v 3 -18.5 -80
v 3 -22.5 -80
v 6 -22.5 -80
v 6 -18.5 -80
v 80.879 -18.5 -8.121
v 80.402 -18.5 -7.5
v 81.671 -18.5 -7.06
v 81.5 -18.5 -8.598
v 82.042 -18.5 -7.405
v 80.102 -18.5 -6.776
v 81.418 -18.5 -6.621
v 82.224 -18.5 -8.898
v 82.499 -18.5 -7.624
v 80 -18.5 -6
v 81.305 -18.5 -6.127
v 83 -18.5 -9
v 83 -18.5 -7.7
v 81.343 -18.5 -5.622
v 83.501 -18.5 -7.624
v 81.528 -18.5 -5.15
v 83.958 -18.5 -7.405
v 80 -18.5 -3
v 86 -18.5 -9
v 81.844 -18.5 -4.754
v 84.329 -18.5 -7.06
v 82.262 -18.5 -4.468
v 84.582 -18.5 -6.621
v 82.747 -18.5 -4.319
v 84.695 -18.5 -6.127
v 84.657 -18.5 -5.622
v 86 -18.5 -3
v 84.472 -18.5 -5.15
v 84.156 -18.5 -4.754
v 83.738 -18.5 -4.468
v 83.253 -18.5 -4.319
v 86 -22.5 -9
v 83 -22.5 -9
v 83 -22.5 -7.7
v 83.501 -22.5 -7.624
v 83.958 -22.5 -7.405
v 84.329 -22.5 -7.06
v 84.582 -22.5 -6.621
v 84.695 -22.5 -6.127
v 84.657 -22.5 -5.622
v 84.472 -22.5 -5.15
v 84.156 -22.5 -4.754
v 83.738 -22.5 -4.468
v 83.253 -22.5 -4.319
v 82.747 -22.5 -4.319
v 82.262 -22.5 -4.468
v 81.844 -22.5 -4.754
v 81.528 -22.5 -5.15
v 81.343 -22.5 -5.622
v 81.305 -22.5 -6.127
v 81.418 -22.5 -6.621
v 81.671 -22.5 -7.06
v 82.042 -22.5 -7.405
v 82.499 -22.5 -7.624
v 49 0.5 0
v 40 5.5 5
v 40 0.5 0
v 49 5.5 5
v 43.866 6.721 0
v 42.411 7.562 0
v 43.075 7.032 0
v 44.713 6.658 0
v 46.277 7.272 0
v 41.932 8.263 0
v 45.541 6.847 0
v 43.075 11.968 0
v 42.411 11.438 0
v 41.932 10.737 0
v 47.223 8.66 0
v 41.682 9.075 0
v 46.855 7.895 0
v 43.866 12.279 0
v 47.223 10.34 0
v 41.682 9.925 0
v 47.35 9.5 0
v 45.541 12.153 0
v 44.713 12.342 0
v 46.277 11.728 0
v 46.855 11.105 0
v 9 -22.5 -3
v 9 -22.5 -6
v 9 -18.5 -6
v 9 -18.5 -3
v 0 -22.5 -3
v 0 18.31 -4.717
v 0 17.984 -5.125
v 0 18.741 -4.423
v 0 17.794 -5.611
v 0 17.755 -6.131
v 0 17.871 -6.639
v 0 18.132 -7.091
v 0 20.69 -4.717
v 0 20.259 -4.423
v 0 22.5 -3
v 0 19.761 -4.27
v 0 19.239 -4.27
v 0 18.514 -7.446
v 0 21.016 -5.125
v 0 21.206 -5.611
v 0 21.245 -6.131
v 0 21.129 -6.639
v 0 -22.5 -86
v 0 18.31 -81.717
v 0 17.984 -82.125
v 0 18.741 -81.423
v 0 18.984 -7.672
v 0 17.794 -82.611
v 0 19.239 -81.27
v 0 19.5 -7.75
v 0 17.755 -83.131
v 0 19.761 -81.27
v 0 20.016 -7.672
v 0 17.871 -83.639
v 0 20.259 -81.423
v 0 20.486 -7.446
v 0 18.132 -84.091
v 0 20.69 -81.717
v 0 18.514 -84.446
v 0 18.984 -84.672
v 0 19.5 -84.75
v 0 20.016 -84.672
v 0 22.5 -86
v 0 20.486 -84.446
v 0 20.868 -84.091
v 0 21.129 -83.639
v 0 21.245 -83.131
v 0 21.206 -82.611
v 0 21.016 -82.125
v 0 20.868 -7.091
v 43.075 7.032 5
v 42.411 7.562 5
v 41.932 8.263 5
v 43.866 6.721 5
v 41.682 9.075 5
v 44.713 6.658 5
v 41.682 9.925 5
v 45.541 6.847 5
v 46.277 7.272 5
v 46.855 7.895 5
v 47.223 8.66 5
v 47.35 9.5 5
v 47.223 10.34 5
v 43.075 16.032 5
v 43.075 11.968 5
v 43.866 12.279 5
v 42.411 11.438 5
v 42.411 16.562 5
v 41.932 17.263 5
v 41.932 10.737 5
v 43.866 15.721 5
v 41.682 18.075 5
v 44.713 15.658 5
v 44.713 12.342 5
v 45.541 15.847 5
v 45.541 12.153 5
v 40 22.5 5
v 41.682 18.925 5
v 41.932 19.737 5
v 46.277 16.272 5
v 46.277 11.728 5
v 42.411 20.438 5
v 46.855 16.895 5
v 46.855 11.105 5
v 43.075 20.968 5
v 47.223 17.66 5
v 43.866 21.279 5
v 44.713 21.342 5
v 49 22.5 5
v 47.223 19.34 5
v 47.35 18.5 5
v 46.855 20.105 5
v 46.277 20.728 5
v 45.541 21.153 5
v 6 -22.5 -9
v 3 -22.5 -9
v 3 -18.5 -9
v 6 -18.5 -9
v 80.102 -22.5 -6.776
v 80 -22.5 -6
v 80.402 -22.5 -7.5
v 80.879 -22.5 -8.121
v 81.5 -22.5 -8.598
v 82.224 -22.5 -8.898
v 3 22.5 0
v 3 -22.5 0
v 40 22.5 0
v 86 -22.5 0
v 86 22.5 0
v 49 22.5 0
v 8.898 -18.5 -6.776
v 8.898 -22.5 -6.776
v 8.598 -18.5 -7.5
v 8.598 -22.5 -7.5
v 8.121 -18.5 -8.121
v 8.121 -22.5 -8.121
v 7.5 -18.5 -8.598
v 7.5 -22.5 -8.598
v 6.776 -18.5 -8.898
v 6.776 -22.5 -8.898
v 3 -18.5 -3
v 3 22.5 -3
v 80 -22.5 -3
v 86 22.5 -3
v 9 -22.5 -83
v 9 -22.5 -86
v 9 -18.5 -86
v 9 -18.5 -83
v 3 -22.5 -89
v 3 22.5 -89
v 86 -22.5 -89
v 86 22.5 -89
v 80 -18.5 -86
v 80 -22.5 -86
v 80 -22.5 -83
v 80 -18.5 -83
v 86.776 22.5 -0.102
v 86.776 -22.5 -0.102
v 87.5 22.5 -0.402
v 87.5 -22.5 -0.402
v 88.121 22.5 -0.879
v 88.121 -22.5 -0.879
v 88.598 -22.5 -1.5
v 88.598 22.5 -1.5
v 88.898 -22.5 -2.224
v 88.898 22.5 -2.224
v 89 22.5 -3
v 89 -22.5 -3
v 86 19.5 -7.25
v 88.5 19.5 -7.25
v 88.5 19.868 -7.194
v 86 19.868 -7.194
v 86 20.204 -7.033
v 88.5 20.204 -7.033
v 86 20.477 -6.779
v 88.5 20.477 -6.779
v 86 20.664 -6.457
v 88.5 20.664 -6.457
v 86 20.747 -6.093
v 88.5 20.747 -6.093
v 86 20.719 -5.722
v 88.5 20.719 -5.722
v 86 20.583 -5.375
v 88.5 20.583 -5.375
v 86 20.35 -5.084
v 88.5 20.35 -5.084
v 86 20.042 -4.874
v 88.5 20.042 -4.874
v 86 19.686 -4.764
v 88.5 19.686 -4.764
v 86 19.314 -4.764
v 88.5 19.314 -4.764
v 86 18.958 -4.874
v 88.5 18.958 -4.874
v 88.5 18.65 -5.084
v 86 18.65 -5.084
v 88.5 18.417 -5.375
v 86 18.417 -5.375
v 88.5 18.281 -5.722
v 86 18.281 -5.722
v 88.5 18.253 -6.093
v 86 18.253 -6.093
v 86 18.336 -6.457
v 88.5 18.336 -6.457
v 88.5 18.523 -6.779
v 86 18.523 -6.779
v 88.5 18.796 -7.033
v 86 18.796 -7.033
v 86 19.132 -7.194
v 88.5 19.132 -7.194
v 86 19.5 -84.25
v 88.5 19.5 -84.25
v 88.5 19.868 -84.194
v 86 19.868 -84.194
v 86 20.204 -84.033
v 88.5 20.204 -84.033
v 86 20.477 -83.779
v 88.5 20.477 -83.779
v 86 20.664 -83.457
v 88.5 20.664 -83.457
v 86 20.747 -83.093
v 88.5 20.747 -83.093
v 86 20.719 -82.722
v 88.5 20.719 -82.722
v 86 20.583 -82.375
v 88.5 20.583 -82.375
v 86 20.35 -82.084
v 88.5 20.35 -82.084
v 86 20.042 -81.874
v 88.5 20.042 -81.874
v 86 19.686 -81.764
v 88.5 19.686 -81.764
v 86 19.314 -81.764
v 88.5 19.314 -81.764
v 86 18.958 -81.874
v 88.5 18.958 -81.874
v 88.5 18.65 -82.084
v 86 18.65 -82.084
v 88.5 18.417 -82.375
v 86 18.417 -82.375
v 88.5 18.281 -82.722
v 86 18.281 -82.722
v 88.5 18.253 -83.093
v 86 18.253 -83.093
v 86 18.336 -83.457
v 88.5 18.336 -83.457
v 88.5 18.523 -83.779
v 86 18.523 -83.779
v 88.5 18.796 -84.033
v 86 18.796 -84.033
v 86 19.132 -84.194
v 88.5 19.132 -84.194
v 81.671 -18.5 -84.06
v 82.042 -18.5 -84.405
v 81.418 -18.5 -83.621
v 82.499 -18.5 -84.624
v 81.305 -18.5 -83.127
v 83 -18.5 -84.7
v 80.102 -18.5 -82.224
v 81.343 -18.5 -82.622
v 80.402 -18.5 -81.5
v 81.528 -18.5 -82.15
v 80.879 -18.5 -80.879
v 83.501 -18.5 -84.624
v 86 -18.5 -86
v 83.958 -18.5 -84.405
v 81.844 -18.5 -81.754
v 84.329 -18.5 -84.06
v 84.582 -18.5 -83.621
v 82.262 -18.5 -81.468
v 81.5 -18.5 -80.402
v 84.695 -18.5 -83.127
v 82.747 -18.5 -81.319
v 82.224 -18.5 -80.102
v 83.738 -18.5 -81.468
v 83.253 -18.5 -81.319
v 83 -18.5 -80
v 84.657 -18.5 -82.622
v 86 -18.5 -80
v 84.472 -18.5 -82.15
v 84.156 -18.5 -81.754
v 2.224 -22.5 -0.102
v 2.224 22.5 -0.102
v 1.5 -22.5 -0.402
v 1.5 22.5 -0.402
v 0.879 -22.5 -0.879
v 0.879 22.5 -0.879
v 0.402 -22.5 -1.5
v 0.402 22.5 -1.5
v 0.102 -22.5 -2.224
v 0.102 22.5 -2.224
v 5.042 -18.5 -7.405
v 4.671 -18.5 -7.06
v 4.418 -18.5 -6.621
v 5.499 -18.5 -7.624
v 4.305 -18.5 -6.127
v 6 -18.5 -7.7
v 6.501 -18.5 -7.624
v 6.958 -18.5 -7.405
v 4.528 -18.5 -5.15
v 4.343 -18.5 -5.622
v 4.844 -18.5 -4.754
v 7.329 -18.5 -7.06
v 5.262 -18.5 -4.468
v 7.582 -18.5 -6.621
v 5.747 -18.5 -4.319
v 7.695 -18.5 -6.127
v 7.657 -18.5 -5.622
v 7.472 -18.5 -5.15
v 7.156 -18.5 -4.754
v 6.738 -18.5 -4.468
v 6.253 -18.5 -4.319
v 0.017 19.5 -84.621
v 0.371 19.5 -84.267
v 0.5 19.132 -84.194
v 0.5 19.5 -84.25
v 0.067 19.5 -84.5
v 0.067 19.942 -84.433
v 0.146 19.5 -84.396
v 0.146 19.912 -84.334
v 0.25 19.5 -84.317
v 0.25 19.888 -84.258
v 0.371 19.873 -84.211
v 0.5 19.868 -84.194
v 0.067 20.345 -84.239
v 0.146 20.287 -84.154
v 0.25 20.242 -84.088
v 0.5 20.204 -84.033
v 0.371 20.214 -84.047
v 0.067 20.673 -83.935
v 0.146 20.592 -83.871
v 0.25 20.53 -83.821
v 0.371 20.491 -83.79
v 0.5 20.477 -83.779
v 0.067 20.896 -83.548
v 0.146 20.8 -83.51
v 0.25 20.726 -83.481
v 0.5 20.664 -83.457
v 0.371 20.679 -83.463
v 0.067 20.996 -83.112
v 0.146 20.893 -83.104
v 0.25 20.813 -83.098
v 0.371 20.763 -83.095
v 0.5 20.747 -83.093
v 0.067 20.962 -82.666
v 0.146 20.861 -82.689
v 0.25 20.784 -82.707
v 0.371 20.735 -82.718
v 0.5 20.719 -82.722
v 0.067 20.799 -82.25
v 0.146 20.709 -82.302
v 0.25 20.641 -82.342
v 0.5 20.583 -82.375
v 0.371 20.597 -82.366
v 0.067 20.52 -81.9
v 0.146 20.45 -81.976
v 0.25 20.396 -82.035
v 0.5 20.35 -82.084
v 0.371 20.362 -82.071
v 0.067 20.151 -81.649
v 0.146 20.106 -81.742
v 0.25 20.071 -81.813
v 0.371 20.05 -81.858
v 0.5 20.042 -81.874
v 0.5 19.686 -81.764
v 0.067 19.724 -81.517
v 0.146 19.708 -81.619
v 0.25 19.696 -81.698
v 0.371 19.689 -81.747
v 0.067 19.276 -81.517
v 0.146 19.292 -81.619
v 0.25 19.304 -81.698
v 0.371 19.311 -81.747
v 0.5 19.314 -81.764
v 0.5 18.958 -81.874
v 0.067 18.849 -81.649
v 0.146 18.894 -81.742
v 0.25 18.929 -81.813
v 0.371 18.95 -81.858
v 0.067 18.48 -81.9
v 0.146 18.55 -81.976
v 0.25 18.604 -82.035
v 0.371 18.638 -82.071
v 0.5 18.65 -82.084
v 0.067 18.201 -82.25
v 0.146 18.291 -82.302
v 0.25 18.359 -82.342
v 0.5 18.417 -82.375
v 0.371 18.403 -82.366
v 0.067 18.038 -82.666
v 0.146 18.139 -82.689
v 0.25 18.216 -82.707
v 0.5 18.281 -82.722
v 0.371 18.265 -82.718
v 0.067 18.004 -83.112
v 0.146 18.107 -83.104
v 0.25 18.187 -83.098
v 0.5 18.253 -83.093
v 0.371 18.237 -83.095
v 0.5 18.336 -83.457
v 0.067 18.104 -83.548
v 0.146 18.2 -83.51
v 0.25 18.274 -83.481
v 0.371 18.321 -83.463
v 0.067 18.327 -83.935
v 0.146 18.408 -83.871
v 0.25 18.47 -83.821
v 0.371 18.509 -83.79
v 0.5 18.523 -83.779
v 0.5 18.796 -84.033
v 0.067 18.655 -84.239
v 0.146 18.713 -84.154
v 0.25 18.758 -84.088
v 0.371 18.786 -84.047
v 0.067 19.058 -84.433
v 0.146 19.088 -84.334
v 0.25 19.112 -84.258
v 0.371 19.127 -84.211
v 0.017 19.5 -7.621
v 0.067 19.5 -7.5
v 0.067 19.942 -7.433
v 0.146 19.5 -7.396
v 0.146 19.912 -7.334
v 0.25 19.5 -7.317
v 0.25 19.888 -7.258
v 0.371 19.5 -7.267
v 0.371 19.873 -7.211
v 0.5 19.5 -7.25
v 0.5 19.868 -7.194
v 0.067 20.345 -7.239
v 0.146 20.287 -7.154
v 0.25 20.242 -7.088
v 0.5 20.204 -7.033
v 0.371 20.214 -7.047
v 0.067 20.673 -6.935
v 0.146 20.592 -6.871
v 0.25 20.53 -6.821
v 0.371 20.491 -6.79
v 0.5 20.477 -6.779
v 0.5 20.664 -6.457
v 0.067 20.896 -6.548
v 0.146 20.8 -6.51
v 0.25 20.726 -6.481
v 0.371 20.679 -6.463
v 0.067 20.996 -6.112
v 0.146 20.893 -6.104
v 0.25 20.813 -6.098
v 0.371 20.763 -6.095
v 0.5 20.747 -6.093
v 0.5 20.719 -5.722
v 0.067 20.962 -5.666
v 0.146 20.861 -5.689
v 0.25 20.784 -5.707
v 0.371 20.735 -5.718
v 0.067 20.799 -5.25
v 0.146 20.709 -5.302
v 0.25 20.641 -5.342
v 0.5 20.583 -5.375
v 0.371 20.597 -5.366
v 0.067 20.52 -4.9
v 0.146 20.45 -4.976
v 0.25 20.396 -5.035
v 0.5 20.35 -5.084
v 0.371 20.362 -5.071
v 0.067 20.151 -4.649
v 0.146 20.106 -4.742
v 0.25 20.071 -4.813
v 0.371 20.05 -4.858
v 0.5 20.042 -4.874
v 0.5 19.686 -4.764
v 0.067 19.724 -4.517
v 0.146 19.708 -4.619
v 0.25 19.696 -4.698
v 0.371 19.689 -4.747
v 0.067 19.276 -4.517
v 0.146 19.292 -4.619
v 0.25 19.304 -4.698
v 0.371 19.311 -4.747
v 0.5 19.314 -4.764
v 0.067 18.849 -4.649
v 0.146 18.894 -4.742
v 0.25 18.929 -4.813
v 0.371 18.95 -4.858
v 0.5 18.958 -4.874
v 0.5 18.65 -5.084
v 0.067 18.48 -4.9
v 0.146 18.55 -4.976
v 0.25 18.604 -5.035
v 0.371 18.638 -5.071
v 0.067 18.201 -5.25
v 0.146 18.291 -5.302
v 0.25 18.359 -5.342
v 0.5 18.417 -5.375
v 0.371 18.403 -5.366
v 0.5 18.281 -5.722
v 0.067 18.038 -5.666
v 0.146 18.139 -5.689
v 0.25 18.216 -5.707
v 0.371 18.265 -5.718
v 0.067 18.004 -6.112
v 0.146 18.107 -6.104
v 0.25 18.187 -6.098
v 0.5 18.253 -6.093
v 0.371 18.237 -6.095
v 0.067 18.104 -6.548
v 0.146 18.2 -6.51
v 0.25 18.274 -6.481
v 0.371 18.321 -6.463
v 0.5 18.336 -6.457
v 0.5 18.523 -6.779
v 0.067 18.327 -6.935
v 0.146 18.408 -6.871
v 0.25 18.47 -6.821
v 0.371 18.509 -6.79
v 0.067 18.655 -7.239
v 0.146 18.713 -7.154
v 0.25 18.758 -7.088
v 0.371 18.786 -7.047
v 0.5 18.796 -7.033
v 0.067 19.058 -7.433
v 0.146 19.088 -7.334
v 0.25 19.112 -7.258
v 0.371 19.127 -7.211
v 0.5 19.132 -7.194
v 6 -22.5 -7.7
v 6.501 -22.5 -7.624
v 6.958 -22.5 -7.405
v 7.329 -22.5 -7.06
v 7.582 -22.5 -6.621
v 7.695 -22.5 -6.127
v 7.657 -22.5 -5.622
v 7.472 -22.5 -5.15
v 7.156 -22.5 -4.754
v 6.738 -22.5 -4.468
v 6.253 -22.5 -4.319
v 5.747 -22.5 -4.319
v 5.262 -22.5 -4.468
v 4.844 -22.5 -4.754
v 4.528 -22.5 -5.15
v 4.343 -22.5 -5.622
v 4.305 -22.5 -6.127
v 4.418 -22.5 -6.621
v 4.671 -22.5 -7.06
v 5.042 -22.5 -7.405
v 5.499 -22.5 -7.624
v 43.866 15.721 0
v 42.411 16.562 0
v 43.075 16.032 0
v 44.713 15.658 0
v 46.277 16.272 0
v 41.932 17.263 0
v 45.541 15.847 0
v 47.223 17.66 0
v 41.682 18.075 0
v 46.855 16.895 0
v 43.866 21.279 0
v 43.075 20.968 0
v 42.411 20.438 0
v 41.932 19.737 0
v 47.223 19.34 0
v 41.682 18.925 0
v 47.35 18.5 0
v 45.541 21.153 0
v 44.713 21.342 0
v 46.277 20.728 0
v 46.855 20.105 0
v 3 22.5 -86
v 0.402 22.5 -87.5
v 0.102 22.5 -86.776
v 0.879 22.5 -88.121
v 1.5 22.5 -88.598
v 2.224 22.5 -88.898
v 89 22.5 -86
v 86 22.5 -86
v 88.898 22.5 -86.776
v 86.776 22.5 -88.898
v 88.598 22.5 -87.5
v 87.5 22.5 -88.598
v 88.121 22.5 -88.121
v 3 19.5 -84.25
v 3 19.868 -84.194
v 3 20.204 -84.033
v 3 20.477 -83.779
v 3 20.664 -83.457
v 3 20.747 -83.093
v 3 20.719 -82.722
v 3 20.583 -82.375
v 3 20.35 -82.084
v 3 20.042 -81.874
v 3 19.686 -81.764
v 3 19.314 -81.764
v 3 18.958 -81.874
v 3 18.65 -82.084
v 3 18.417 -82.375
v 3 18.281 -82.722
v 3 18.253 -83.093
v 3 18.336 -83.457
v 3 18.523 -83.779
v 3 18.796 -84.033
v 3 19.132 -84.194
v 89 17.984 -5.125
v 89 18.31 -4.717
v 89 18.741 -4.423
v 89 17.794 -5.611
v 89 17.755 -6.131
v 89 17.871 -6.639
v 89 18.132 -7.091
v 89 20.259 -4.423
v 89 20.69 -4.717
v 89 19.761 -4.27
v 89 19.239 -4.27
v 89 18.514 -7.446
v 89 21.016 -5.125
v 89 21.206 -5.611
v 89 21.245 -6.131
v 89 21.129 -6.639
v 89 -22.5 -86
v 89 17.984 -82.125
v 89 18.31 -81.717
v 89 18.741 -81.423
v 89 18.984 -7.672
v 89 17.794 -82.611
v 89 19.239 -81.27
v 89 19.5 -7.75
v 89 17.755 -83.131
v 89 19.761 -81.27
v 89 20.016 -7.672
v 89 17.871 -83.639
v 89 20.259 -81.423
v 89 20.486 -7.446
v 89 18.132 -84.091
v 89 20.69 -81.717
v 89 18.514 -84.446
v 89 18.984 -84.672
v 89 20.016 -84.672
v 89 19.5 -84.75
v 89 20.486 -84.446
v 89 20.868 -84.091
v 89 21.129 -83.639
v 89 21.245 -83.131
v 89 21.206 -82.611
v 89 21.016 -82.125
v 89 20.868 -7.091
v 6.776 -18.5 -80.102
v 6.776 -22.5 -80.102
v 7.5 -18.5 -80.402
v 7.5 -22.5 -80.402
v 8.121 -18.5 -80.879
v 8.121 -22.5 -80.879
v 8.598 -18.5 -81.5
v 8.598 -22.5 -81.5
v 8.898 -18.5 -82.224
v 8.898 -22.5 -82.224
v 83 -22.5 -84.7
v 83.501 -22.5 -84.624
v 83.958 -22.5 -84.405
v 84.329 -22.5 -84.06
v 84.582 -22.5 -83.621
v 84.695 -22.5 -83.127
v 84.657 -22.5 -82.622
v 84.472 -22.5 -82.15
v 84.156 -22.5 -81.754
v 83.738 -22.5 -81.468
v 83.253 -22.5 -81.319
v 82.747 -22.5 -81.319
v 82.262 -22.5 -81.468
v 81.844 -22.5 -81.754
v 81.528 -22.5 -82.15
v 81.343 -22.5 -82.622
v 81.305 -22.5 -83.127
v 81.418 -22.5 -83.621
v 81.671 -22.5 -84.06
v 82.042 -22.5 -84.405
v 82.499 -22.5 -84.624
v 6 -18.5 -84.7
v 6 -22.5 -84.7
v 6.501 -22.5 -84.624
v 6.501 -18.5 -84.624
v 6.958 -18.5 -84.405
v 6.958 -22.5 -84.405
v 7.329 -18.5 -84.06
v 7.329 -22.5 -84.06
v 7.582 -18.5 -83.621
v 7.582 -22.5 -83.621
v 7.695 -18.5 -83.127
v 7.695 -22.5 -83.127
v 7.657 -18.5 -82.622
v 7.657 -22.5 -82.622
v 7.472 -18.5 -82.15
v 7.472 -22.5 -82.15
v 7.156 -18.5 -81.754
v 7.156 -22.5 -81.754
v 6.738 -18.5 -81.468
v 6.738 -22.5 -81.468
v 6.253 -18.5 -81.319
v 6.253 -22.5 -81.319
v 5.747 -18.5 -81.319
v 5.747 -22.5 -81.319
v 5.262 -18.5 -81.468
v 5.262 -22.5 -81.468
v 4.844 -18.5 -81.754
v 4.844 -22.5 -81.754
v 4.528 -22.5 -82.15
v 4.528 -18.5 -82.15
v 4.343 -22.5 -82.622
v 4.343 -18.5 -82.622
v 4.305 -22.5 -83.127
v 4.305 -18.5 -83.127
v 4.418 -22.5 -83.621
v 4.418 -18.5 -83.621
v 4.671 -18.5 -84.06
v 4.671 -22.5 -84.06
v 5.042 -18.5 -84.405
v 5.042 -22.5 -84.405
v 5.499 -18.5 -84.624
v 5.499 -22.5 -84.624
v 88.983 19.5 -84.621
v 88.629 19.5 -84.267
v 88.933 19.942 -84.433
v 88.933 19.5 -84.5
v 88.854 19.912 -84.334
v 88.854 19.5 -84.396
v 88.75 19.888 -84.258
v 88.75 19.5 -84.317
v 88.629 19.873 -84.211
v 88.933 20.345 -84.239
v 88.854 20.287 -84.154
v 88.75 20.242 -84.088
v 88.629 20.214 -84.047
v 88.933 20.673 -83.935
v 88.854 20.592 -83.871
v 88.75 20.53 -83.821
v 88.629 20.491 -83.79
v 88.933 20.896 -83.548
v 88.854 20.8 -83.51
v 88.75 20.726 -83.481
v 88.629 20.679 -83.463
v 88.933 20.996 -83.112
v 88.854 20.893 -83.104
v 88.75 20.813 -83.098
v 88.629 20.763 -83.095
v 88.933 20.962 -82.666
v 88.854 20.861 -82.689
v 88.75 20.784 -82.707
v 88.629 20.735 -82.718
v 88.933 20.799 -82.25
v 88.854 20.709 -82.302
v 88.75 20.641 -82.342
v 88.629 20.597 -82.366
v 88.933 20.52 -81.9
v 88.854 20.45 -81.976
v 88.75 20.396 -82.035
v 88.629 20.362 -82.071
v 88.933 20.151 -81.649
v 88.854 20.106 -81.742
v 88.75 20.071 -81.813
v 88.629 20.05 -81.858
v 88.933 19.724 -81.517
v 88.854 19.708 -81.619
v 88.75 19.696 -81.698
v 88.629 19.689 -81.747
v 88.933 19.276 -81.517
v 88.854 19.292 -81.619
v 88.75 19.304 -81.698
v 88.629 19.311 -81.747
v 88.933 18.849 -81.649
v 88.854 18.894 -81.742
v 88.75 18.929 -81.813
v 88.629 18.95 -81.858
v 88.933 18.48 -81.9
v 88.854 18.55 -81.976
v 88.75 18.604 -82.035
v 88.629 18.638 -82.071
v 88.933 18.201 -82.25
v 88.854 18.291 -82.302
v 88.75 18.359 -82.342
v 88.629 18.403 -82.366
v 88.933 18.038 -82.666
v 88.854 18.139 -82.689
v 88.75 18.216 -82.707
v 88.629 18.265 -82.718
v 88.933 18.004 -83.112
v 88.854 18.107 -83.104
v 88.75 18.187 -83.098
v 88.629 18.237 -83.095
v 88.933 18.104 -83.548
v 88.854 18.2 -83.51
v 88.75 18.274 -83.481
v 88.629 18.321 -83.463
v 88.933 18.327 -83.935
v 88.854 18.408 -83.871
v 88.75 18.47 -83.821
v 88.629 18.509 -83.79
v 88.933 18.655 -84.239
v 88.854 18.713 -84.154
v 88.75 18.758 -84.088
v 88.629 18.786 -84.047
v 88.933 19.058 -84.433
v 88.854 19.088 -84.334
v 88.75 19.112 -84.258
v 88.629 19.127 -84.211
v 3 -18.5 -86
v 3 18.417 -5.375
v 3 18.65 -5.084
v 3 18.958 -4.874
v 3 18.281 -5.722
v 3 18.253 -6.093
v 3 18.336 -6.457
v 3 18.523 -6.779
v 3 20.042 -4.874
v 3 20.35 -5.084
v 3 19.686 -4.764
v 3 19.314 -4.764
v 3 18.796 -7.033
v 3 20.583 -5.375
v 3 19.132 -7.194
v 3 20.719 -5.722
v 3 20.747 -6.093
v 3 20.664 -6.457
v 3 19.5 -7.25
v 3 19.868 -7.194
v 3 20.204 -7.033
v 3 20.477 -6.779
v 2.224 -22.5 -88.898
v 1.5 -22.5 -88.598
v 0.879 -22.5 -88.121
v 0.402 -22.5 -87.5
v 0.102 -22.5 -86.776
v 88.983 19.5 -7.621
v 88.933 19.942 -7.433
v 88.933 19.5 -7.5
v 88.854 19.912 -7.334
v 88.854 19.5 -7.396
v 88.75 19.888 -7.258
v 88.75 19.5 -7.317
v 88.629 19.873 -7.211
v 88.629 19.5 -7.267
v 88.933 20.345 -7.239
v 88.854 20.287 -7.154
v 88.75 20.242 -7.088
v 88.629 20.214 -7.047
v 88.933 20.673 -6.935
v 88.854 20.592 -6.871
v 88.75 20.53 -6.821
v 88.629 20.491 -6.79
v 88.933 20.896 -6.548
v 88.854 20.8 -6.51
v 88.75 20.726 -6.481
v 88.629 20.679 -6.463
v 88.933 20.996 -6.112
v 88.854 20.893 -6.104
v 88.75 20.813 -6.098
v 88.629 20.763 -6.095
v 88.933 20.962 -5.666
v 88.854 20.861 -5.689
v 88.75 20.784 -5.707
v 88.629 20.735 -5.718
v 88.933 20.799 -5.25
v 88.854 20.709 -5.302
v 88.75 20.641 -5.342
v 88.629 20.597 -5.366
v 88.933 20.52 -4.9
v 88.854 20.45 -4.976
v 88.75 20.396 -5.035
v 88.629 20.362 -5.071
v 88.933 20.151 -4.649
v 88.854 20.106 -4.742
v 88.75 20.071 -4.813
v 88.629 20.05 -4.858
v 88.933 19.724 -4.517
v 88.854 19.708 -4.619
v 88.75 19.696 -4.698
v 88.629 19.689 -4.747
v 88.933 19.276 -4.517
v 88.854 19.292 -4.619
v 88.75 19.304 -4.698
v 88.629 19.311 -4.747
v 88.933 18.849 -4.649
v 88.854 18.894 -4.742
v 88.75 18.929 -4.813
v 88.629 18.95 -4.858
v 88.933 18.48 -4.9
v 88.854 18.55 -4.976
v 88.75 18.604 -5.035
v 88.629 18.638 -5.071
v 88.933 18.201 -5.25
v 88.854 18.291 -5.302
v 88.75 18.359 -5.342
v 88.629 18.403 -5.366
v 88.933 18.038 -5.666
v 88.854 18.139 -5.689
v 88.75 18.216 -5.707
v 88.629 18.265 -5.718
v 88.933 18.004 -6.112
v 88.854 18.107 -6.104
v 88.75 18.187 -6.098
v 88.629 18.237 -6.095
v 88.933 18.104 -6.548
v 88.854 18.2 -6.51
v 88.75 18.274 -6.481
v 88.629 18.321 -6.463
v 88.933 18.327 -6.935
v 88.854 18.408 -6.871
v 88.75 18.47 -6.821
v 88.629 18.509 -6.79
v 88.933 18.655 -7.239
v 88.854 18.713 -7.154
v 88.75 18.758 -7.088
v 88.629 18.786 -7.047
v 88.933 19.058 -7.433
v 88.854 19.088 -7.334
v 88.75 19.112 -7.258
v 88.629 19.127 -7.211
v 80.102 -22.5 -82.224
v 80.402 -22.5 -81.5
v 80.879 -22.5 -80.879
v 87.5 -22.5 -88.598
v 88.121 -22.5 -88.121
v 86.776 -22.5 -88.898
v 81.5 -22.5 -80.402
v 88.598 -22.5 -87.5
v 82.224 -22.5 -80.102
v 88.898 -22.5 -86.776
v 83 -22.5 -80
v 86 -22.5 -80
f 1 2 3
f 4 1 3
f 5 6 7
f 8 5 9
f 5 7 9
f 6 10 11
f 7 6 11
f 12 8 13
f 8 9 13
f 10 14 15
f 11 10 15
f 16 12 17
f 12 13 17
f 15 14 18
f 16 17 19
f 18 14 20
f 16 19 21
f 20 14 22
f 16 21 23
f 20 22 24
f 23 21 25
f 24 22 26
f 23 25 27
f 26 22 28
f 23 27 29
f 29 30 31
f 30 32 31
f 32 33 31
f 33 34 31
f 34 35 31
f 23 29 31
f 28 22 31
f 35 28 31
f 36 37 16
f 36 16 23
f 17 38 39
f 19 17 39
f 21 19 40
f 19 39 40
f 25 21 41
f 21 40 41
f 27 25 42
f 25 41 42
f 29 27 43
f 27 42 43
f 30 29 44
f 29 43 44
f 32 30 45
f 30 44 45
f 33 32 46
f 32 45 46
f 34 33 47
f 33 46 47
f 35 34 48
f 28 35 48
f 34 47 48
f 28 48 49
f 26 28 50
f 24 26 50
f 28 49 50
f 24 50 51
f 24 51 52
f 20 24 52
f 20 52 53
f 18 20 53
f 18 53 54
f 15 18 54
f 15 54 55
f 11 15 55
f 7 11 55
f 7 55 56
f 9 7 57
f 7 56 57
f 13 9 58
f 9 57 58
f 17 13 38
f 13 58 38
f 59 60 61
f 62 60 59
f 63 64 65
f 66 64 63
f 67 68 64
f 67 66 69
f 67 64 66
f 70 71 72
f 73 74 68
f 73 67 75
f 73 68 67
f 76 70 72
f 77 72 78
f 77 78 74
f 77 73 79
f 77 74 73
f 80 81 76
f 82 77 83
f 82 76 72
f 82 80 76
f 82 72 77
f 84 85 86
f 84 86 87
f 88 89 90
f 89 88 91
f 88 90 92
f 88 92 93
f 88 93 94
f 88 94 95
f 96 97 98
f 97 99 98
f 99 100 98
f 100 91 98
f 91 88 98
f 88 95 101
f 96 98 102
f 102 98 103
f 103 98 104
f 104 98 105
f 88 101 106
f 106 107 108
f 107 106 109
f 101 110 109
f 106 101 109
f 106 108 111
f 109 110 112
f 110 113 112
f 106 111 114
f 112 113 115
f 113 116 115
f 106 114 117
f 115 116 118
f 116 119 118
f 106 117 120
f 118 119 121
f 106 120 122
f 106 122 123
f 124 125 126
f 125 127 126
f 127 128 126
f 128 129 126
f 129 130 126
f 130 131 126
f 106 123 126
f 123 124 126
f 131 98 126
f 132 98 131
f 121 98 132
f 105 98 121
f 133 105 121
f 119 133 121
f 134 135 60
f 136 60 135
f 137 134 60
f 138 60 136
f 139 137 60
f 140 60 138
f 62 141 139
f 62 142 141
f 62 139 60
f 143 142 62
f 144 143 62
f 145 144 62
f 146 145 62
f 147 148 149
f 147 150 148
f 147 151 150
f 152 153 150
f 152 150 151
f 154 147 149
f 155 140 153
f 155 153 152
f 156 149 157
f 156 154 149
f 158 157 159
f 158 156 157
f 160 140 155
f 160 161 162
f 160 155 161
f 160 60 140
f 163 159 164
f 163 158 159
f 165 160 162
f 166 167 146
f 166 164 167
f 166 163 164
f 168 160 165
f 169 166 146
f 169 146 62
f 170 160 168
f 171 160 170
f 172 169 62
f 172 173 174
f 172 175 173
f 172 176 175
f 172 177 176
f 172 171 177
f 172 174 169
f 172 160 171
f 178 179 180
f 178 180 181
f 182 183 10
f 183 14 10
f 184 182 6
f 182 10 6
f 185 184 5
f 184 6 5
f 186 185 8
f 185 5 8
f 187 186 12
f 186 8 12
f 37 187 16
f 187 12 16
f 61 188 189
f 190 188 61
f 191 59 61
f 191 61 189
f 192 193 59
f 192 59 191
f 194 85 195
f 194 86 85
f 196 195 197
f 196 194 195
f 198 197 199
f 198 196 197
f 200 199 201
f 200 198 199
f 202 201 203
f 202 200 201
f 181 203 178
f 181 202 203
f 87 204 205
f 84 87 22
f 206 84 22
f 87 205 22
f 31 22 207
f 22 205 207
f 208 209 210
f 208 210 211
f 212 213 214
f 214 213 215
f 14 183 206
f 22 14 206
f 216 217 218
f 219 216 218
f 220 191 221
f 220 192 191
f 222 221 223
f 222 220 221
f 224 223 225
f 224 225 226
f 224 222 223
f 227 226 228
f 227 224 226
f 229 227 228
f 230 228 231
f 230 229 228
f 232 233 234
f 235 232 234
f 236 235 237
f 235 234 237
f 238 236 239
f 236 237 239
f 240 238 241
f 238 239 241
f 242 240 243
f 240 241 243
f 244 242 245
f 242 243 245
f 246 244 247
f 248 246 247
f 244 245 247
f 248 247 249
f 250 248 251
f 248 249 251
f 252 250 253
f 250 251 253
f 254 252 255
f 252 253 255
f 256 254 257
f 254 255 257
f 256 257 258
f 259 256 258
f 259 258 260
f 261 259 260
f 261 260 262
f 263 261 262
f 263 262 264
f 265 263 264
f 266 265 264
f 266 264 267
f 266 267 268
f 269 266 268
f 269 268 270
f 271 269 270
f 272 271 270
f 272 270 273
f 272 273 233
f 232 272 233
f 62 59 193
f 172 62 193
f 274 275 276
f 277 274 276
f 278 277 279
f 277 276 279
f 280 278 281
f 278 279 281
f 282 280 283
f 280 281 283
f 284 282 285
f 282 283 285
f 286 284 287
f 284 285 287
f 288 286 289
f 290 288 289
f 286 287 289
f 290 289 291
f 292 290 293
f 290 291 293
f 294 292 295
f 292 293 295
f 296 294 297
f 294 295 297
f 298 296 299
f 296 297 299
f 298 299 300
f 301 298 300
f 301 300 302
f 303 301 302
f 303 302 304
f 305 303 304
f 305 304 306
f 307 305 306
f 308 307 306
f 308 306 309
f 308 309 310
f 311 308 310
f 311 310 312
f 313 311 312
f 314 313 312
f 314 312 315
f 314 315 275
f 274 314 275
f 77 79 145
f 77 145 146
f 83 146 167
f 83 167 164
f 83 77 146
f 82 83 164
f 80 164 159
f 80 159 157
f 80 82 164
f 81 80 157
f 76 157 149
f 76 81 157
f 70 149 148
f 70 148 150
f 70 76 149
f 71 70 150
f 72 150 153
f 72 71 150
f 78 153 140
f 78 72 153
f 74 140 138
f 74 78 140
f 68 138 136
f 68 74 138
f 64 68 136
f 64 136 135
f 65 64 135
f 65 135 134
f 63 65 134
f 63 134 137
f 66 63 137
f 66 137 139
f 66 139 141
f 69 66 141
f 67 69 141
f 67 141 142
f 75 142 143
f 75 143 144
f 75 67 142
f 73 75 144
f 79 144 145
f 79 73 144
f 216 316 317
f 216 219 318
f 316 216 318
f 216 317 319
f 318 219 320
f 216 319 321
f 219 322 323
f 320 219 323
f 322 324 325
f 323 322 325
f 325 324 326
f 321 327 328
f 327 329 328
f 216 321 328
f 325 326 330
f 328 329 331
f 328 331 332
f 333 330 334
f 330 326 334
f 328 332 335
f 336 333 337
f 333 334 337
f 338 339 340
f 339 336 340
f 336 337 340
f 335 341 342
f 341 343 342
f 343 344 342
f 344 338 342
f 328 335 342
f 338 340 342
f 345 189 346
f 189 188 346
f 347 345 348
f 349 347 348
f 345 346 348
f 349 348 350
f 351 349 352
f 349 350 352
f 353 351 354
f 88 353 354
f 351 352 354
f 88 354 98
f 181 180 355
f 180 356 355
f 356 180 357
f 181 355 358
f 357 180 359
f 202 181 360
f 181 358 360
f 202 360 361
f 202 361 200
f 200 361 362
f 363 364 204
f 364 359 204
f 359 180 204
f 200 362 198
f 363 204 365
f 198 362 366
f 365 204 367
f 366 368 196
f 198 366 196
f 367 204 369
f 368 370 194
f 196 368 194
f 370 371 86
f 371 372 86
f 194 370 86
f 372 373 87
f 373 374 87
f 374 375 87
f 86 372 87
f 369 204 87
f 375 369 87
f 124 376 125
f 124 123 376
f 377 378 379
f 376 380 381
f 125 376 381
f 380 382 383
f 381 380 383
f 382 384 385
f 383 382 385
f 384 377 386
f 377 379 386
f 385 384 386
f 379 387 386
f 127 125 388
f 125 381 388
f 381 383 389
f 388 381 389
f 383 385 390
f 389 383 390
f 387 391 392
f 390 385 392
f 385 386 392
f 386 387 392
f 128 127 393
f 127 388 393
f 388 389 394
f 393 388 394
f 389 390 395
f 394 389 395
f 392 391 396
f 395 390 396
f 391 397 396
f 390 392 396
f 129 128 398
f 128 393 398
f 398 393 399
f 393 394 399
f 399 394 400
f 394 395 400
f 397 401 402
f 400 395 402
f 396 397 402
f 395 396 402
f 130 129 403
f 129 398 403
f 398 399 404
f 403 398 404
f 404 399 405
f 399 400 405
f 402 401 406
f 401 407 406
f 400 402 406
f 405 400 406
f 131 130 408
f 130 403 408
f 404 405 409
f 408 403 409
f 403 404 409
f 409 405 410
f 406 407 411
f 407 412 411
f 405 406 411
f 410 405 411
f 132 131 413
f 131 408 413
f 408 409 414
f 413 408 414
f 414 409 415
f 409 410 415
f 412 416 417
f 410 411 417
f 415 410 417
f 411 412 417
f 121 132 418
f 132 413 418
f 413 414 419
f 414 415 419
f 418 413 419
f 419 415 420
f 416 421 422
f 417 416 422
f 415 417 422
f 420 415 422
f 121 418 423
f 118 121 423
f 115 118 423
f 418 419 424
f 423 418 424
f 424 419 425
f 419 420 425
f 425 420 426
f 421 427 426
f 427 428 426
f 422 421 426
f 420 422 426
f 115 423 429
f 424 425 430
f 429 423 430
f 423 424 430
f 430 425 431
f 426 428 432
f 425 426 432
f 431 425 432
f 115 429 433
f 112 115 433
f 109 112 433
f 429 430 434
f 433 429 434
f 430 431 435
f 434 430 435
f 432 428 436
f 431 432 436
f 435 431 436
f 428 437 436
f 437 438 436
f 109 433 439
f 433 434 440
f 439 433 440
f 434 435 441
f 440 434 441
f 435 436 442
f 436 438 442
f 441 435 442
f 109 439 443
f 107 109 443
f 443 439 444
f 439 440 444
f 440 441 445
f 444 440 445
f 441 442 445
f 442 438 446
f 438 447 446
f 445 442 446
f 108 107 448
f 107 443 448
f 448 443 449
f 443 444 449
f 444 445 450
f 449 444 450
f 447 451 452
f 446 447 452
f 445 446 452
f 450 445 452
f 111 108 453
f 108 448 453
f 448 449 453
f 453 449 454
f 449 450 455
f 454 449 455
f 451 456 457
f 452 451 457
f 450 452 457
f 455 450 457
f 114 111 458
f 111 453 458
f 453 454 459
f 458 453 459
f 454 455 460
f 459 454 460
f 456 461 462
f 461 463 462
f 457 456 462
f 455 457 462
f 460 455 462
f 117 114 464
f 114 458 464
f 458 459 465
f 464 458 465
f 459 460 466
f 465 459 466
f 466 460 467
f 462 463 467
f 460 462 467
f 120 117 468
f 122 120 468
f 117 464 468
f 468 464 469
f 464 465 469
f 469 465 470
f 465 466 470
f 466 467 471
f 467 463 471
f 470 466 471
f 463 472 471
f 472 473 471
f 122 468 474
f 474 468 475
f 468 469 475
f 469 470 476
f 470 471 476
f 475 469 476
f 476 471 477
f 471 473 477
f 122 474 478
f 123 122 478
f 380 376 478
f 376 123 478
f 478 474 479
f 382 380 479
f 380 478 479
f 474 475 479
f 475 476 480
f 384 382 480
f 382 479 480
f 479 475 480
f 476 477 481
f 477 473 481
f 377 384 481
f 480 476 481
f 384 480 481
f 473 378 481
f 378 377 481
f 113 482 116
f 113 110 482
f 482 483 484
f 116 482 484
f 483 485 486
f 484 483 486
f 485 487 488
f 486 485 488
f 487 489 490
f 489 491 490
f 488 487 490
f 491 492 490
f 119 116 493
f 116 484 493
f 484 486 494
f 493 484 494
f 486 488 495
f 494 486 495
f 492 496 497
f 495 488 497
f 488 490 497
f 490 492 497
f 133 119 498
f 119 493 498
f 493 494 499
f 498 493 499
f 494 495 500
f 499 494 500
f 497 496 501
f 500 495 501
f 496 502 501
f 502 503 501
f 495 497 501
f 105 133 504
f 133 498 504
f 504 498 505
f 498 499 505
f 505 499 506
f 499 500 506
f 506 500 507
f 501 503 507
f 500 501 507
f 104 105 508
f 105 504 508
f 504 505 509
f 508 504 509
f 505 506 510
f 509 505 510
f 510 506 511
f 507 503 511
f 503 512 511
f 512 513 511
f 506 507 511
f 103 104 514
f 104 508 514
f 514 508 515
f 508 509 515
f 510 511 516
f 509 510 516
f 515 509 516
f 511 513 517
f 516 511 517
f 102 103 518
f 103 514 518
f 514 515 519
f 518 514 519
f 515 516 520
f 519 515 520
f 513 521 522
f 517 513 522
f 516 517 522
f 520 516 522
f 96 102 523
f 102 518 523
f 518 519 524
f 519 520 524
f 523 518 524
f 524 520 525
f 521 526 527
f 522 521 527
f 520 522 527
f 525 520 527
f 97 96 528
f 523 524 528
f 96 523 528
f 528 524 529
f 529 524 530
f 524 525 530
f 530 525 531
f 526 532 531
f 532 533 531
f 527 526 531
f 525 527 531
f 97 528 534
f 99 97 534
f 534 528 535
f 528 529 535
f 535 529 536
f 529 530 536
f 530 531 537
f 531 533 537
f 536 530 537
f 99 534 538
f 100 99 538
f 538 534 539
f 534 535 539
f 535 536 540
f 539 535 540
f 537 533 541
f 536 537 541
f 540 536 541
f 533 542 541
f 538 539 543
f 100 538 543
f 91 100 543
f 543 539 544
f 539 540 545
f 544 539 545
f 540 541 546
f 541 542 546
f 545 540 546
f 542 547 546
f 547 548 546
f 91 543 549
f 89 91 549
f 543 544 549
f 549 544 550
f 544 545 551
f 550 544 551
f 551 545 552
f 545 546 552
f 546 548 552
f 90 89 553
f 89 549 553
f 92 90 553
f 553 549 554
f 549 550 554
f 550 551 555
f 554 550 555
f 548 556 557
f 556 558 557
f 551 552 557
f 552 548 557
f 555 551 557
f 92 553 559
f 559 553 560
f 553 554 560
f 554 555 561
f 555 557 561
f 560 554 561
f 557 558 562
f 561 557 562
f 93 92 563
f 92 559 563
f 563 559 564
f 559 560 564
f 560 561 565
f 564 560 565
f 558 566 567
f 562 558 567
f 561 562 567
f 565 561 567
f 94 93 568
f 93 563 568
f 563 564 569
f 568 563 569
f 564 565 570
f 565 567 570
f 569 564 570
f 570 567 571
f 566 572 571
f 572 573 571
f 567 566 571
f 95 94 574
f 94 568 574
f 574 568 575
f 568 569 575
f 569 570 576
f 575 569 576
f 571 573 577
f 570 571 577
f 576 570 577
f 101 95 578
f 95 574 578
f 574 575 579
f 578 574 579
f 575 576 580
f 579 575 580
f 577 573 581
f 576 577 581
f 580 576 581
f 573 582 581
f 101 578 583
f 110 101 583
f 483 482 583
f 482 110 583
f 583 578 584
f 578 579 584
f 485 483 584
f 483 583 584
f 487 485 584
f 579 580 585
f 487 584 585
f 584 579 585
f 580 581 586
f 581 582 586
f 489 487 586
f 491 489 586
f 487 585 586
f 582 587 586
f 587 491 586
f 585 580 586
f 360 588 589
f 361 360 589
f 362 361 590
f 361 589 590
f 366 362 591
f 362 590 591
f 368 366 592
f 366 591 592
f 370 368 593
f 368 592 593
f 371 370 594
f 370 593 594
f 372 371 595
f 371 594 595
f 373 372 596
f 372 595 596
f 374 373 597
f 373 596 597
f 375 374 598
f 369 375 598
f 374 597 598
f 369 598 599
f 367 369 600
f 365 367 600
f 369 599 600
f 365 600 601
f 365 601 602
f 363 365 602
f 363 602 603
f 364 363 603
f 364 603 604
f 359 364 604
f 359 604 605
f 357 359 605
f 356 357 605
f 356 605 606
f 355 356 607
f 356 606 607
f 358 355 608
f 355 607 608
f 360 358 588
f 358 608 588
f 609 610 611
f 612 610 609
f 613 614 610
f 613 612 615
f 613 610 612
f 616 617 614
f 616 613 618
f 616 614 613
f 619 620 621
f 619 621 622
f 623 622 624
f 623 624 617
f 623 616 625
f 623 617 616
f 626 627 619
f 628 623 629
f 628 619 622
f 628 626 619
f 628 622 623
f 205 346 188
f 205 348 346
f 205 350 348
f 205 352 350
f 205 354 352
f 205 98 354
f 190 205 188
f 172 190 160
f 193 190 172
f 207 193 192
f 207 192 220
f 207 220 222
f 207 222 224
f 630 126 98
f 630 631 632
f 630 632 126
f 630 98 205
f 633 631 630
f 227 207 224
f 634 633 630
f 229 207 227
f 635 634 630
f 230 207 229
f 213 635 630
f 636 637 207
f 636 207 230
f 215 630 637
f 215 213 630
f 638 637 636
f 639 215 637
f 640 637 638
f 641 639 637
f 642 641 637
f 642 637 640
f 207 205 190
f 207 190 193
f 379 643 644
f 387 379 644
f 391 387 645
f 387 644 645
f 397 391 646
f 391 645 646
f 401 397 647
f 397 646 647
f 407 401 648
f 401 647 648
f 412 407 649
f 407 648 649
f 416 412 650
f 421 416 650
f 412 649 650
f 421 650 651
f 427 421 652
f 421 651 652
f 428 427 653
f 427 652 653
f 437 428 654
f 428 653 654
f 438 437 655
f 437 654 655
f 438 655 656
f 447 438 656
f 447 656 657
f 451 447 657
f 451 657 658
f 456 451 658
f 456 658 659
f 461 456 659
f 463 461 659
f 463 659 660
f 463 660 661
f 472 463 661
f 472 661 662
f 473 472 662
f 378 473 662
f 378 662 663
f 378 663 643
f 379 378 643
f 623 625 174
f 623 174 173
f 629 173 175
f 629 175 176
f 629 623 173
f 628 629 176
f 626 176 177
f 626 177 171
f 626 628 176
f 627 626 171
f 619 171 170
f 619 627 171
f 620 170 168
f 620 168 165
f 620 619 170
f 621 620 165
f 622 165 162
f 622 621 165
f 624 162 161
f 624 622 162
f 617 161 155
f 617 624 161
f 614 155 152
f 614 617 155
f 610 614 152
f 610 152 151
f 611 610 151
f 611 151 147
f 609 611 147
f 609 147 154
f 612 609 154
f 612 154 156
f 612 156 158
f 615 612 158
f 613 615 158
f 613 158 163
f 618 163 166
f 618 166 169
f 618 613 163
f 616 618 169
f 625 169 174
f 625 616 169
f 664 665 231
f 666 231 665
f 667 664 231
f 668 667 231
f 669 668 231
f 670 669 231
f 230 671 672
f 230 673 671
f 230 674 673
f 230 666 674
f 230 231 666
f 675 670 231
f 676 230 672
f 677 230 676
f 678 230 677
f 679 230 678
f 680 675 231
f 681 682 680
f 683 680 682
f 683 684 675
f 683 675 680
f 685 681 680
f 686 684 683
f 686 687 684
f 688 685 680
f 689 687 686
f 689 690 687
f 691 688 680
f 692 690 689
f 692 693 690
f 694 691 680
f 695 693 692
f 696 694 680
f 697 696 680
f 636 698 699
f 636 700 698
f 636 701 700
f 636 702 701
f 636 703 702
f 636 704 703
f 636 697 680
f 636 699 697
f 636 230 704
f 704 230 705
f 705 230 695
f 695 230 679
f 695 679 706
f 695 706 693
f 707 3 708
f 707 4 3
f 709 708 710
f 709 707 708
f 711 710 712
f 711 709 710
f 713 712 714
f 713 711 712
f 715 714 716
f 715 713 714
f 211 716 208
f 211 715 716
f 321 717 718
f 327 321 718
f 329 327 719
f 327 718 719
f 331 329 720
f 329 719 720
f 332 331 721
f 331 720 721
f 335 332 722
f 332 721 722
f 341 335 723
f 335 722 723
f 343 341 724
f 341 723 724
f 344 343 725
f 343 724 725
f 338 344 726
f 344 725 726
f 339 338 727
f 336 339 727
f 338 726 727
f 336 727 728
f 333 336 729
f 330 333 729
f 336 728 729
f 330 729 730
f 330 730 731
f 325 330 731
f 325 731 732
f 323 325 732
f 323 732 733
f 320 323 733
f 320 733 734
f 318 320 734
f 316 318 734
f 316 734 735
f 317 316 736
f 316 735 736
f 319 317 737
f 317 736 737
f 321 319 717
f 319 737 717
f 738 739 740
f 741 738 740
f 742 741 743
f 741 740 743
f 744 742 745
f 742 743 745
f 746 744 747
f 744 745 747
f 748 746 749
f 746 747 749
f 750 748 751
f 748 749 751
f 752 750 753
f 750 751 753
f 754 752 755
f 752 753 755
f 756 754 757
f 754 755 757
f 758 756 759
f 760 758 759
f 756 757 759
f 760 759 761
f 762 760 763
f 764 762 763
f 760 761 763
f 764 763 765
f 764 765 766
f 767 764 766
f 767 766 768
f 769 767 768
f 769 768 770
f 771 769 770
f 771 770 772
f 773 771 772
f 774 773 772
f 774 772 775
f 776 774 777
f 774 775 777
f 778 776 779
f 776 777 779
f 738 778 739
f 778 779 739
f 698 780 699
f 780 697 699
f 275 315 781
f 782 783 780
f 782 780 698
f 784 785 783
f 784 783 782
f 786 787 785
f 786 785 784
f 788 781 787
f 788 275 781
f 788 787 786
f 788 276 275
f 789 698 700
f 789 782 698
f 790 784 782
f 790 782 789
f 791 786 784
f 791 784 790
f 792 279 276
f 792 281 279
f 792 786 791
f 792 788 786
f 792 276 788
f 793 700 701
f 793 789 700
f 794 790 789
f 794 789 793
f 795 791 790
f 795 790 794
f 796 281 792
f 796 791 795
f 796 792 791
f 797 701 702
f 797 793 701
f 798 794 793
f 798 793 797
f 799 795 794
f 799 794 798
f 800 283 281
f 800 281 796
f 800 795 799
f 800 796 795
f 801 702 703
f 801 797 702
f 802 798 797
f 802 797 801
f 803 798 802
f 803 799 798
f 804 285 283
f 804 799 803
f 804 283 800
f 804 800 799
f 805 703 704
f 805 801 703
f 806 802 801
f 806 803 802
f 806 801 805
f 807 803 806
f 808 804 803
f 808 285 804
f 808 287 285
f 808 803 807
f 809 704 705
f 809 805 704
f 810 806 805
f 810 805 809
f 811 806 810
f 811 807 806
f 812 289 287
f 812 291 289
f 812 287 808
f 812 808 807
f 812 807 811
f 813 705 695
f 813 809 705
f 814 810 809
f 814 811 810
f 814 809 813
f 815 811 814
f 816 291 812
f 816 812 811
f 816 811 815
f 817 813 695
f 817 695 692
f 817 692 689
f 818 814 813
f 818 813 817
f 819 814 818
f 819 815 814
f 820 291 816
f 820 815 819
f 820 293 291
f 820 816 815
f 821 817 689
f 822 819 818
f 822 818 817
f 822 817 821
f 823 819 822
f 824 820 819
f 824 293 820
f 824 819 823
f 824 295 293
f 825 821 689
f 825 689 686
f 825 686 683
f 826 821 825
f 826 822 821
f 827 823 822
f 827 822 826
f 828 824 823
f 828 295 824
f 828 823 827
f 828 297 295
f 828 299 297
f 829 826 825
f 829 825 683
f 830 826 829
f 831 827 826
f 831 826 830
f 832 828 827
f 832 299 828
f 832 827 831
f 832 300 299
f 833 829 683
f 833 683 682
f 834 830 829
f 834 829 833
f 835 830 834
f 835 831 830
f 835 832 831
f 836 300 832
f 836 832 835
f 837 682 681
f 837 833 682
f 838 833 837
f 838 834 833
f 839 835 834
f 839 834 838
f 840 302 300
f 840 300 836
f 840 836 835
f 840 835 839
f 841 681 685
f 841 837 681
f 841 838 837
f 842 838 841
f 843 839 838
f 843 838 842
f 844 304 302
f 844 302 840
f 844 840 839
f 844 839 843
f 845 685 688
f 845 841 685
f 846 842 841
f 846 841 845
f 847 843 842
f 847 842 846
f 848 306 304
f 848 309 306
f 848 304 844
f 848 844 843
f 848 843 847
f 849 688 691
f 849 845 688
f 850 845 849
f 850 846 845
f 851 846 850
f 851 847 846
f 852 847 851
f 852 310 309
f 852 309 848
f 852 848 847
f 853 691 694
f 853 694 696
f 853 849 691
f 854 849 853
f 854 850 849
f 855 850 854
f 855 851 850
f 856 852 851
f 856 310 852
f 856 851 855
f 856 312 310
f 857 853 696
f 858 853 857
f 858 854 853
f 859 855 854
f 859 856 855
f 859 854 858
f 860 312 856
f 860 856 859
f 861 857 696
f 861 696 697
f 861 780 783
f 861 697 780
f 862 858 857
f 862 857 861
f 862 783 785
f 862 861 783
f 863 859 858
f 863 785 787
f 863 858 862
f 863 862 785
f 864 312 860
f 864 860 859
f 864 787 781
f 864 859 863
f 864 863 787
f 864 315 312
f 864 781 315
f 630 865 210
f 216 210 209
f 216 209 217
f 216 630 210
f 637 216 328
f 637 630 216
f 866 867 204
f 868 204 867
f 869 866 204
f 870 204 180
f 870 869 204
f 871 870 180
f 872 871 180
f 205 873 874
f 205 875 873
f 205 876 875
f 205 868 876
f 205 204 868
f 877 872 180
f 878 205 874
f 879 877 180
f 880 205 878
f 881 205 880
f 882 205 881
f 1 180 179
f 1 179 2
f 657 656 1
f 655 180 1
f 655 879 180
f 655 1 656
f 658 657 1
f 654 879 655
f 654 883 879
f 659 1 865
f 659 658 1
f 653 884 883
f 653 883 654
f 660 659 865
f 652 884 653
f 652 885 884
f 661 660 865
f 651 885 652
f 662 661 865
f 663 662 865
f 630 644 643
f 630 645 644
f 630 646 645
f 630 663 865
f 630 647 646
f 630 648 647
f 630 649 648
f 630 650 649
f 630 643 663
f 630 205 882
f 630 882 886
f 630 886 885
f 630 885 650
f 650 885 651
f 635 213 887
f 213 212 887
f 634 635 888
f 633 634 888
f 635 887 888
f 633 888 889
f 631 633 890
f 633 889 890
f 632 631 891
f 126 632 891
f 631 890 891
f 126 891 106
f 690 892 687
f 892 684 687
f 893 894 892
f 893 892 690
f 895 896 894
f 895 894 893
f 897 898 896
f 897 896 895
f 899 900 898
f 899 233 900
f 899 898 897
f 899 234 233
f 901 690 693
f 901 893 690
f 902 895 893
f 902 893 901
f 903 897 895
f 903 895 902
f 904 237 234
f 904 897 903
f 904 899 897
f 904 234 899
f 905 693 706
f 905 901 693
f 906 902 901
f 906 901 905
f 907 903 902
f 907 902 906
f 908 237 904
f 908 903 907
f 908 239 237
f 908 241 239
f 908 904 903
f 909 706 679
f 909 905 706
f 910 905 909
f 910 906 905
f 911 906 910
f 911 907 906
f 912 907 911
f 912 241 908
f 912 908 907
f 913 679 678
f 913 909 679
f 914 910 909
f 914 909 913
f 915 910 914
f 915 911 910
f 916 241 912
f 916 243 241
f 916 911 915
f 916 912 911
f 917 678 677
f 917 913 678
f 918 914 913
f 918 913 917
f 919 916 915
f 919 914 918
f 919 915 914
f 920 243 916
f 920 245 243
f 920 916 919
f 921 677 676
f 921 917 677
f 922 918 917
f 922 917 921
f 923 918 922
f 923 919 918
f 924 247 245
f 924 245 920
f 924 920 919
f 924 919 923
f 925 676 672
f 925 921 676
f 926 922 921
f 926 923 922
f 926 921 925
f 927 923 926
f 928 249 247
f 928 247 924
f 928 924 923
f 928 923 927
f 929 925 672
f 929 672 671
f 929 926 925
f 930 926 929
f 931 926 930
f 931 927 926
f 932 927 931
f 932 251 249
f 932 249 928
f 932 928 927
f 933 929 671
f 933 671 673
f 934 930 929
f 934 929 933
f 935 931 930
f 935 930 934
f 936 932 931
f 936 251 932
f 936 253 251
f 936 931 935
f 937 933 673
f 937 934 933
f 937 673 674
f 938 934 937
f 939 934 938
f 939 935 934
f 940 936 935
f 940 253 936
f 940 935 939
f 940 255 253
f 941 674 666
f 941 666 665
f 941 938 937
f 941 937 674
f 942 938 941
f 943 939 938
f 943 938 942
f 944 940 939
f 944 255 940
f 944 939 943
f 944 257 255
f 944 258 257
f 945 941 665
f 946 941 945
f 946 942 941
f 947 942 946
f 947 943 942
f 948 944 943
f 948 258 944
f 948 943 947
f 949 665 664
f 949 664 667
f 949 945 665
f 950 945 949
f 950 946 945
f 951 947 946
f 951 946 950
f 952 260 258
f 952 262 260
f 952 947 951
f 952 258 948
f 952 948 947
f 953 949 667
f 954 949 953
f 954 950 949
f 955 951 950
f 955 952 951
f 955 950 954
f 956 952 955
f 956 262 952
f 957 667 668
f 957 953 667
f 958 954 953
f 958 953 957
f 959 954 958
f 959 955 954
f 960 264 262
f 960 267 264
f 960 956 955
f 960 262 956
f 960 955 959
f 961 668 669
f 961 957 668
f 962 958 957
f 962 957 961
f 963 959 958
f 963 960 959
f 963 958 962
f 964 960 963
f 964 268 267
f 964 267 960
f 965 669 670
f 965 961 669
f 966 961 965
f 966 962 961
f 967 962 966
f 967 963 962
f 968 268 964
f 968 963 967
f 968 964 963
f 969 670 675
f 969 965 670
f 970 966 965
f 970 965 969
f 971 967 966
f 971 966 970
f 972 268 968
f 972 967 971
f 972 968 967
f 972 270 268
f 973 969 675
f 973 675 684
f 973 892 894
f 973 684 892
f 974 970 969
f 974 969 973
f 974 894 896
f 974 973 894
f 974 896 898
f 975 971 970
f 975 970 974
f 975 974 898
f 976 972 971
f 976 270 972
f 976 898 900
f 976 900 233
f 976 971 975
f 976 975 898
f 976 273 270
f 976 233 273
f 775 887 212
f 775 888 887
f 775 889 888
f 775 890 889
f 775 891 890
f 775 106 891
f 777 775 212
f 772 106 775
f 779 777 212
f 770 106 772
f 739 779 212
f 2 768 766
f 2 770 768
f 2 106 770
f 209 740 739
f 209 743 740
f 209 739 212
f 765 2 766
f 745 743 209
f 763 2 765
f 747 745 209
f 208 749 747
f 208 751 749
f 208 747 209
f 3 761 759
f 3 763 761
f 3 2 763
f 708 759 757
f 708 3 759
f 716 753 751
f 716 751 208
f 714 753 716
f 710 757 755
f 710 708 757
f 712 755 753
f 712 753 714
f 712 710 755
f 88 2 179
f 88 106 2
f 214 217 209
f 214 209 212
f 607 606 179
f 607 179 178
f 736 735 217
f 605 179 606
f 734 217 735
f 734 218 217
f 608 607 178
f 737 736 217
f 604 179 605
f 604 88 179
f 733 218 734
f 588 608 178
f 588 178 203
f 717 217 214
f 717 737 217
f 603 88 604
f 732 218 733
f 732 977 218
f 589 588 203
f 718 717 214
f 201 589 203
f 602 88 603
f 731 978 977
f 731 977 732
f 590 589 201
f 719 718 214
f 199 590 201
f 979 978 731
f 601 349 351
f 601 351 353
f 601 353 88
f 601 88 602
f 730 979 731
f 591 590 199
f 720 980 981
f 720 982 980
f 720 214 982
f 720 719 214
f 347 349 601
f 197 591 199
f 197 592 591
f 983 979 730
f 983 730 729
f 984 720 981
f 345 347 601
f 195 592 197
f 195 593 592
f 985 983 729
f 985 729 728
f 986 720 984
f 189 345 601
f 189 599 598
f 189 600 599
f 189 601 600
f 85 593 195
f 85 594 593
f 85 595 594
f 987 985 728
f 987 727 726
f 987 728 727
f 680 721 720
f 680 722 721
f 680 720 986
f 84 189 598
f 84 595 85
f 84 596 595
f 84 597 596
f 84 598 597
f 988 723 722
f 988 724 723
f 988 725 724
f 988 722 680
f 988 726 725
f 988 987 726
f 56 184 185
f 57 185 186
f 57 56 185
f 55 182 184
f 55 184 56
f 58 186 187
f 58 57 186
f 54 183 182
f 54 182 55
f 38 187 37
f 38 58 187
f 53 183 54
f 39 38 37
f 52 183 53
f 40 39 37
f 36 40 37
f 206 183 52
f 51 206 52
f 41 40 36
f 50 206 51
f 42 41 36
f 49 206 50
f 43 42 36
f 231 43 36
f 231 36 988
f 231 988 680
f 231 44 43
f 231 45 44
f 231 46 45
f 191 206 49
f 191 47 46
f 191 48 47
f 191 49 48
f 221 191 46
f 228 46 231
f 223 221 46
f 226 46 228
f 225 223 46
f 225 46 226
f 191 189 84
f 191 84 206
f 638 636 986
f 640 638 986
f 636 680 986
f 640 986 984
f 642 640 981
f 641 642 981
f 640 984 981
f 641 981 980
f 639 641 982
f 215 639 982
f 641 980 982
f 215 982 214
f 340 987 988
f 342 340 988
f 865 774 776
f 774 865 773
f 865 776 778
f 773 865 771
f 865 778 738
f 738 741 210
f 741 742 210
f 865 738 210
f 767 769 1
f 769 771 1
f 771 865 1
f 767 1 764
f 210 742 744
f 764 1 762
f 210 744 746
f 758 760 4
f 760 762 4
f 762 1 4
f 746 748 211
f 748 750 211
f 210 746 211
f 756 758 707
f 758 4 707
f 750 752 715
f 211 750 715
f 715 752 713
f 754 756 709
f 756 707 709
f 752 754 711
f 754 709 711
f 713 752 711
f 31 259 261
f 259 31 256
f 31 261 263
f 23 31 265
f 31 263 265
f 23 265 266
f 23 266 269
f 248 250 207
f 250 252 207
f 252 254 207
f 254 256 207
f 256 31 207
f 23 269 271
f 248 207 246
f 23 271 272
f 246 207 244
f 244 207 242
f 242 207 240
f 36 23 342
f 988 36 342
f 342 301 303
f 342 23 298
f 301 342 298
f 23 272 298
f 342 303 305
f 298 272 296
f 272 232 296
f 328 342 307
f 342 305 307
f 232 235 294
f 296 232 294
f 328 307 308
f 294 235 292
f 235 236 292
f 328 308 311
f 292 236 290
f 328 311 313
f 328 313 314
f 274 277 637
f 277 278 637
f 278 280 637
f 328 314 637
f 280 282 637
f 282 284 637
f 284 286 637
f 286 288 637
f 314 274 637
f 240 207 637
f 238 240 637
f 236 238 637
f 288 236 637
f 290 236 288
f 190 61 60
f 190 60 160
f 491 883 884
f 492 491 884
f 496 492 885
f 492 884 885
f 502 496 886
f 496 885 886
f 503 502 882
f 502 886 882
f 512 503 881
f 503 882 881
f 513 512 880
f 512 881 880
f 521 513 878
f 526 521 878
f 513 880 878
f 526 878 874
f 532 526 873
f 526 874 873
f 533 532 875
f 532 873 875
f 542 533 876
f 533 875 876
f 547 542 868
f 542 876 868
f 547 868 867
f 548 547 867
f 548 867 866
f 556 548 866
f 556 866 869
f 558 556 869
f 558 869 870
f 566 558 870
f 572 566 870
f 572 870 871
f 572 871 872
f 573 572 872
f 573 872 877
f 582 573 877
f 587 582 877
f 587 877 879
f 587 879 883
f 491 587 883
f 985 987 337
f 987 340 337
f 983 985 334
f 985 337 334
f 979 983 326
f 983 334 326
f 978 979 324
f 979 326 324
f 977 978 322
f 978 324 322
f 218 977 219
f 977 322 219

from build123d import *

# Parameters (mm, degrees)
SKETCH1_W           = 89
SKETCH1_H           = 89
SKETCH1_W_2         = 83
SKETCH1_H_2         = 83
BOSS_EXTRUDE1_DEPTH = 22.5
SKETCH4_W           = 6
SKETCH4_H           = 6
SKETCH4_R           = 1.7
BOSS_EXTRUDE3_DEPTH = 4
FILLET3_R           = 3
SKETCH6_W           = 9
SKETCH6_H           = 17
SKETCH6_R           = 2.85
BOSS_EXTRUDE4_DEPTH = 5
CHAMFER1_SIZE       = 5
FILLET4_R           = 3
SKETCH7_R           = 1.25
CUT_EXTRUDE1_DEPTH  = 128.860275301
FILLET5_R           = 0.5


with BuildPart() as part:
    # Sketch1 → Boss-Extrude1 (new, symmetric)
    with BuildSketch(Plane(origin=(0, 0, 0), x_dir=(1, 0, 0), z_dir=(0, 1, 0))):
        with Locations((44.5, 44.5)):
            Rectangle(SKETCH1_W, SKETCH1_H)
        with Locations((44.5, 44.5)):
            Rectangle(SKETCH1_W_2, SKETCH1_H_2, mode=Mode.SUBTRACT)
    extrude(amount=BOSS_EXTRUDE1_DEPTH, both=True)

    # Sketch4 → Boss-Extrude3 (add)
    # profile 1 of 4: a face of its own
    with BuildSketch(Plane.XZ.offset(22.5)):
        with Locations((83, -6)):
            Rectangle(SKETCH4_W, SKETCH4_H)
        with Locations(Location((83, -6, 0), (0, 0, 270))):
            Circle(SKETCH4_R, mode=Mode.SUBTRACT)
    # profile 2 of 4: a face of its own
    with BuildSketch(Plane.XZ.offset(22.5)):
        with Locations((6, -6)):
            Rectangle(SKETCH4_W, SKETCH4_H)
        with Locations(Location((6, -6, 0), (0, 0, 270))):
            Circle(SKETCH4_R, mode=Mode.SUBTRACT)
    # profile 3 of 4: a face of its own
    with BuildSketch(Plane.XZ.offset(22.5)):
        with Locations((83, -83)):
            Rectangle(SKETCH4_W, SKETCH4_H)
        with Locations(Location((83, -83, 0), (0, 0, 270))):
            Circle(SKETCH4_R, mode=Mode.SUBTRACT)
    # profile 4 of 4: a face of its own
    with BuildSketch(Plane.XZ.offset(22.5)):
        with Locations((6, -83)):
            Rectangle(SKETCH4_W, SKETCH4_H)
        with Locations(Location((6, -83, 0), (0, 0, 270))):
            Circle(SKETCH4_R, mode=Mode.SUBTRACT)
    extrude(amount=-BOSS_EXTRUDE3_DEPTH)

    # Fillet3
    fillet3_edges = [part.edges().sort_by_distance(p)[0] for p in [
        (9, -20.5, -9),
        (80, -20.5, -9),
        (9, -20.5, -80),
        (80, -20.5, -80),
    ]]
    fillet(fillet3_edges, radius=FILLET3_R)

    # Sketch6 → Boss-Extrude4 (add)
    with BuildSketch(Plane.XY):
        with Locations((44.5, 14)):
            Rectangle(SKETCH6_W, SKETCH6_H)
        with Locations((44.5, 18.5)):
            Circle(SKETCH6_R, mode=Mode.SUBTRACT)
        with Locations((44.5, 9.5)):
            Circle(SKETCH6_R, mode=Mode.SUBTRACT)
    extrude(amount=BOSS_EXTRUDE4_DEPTH)

    # Chamfer1
    chamfer1_edges = [part.edges().sort_by_distance(p)[0] for p in [
        (44.5, 5.5, 0),
    ]]
    chamfer(chamfer1_edges, length=CHAMFER1_SIZE - 0.0001)  # a hair under: the kernel refuses the full size

    # Fillet4
    fillet4_edges = [part.edges().sort_by_distance(p)[0] for p in [
        (0, 0, -89),
        (89, 0, -89),
        (89, 0, 0),
        (0, 0, 0),
    ]]
    fillet(fillet4_edges, radius=FILLET4_R)

    # Sketch7 → Cut-Extrude1 (cut, through all)
    with BuildSketch(Plane(origin=(89, 0, 0), x_dir=(0, 0, -1), z_dir=(1, 0, 0))):
        with Locations((83, 19.5)):
            Circle(SKETCH7_R)
        with Locations((6, 19.5)):
            Circle(SKETCH7_R)
    extrude(amount=-CUT_EXTRUDE1_DEPTH, mode=Mode.SUBTRACT)

    # Fillet5
    fillet5_edges = [part.edges().sort_by_distance(p)[0] for p in [
        (0, 19.5, -81.75),
        (89, 19.5, -81.75),
        (0, 19.5, -4.75),
        (89, 19.5, -4.75),
    ]]
    fillet(fillet5_edges, radius=FILLET5_R)


solid = part.part
